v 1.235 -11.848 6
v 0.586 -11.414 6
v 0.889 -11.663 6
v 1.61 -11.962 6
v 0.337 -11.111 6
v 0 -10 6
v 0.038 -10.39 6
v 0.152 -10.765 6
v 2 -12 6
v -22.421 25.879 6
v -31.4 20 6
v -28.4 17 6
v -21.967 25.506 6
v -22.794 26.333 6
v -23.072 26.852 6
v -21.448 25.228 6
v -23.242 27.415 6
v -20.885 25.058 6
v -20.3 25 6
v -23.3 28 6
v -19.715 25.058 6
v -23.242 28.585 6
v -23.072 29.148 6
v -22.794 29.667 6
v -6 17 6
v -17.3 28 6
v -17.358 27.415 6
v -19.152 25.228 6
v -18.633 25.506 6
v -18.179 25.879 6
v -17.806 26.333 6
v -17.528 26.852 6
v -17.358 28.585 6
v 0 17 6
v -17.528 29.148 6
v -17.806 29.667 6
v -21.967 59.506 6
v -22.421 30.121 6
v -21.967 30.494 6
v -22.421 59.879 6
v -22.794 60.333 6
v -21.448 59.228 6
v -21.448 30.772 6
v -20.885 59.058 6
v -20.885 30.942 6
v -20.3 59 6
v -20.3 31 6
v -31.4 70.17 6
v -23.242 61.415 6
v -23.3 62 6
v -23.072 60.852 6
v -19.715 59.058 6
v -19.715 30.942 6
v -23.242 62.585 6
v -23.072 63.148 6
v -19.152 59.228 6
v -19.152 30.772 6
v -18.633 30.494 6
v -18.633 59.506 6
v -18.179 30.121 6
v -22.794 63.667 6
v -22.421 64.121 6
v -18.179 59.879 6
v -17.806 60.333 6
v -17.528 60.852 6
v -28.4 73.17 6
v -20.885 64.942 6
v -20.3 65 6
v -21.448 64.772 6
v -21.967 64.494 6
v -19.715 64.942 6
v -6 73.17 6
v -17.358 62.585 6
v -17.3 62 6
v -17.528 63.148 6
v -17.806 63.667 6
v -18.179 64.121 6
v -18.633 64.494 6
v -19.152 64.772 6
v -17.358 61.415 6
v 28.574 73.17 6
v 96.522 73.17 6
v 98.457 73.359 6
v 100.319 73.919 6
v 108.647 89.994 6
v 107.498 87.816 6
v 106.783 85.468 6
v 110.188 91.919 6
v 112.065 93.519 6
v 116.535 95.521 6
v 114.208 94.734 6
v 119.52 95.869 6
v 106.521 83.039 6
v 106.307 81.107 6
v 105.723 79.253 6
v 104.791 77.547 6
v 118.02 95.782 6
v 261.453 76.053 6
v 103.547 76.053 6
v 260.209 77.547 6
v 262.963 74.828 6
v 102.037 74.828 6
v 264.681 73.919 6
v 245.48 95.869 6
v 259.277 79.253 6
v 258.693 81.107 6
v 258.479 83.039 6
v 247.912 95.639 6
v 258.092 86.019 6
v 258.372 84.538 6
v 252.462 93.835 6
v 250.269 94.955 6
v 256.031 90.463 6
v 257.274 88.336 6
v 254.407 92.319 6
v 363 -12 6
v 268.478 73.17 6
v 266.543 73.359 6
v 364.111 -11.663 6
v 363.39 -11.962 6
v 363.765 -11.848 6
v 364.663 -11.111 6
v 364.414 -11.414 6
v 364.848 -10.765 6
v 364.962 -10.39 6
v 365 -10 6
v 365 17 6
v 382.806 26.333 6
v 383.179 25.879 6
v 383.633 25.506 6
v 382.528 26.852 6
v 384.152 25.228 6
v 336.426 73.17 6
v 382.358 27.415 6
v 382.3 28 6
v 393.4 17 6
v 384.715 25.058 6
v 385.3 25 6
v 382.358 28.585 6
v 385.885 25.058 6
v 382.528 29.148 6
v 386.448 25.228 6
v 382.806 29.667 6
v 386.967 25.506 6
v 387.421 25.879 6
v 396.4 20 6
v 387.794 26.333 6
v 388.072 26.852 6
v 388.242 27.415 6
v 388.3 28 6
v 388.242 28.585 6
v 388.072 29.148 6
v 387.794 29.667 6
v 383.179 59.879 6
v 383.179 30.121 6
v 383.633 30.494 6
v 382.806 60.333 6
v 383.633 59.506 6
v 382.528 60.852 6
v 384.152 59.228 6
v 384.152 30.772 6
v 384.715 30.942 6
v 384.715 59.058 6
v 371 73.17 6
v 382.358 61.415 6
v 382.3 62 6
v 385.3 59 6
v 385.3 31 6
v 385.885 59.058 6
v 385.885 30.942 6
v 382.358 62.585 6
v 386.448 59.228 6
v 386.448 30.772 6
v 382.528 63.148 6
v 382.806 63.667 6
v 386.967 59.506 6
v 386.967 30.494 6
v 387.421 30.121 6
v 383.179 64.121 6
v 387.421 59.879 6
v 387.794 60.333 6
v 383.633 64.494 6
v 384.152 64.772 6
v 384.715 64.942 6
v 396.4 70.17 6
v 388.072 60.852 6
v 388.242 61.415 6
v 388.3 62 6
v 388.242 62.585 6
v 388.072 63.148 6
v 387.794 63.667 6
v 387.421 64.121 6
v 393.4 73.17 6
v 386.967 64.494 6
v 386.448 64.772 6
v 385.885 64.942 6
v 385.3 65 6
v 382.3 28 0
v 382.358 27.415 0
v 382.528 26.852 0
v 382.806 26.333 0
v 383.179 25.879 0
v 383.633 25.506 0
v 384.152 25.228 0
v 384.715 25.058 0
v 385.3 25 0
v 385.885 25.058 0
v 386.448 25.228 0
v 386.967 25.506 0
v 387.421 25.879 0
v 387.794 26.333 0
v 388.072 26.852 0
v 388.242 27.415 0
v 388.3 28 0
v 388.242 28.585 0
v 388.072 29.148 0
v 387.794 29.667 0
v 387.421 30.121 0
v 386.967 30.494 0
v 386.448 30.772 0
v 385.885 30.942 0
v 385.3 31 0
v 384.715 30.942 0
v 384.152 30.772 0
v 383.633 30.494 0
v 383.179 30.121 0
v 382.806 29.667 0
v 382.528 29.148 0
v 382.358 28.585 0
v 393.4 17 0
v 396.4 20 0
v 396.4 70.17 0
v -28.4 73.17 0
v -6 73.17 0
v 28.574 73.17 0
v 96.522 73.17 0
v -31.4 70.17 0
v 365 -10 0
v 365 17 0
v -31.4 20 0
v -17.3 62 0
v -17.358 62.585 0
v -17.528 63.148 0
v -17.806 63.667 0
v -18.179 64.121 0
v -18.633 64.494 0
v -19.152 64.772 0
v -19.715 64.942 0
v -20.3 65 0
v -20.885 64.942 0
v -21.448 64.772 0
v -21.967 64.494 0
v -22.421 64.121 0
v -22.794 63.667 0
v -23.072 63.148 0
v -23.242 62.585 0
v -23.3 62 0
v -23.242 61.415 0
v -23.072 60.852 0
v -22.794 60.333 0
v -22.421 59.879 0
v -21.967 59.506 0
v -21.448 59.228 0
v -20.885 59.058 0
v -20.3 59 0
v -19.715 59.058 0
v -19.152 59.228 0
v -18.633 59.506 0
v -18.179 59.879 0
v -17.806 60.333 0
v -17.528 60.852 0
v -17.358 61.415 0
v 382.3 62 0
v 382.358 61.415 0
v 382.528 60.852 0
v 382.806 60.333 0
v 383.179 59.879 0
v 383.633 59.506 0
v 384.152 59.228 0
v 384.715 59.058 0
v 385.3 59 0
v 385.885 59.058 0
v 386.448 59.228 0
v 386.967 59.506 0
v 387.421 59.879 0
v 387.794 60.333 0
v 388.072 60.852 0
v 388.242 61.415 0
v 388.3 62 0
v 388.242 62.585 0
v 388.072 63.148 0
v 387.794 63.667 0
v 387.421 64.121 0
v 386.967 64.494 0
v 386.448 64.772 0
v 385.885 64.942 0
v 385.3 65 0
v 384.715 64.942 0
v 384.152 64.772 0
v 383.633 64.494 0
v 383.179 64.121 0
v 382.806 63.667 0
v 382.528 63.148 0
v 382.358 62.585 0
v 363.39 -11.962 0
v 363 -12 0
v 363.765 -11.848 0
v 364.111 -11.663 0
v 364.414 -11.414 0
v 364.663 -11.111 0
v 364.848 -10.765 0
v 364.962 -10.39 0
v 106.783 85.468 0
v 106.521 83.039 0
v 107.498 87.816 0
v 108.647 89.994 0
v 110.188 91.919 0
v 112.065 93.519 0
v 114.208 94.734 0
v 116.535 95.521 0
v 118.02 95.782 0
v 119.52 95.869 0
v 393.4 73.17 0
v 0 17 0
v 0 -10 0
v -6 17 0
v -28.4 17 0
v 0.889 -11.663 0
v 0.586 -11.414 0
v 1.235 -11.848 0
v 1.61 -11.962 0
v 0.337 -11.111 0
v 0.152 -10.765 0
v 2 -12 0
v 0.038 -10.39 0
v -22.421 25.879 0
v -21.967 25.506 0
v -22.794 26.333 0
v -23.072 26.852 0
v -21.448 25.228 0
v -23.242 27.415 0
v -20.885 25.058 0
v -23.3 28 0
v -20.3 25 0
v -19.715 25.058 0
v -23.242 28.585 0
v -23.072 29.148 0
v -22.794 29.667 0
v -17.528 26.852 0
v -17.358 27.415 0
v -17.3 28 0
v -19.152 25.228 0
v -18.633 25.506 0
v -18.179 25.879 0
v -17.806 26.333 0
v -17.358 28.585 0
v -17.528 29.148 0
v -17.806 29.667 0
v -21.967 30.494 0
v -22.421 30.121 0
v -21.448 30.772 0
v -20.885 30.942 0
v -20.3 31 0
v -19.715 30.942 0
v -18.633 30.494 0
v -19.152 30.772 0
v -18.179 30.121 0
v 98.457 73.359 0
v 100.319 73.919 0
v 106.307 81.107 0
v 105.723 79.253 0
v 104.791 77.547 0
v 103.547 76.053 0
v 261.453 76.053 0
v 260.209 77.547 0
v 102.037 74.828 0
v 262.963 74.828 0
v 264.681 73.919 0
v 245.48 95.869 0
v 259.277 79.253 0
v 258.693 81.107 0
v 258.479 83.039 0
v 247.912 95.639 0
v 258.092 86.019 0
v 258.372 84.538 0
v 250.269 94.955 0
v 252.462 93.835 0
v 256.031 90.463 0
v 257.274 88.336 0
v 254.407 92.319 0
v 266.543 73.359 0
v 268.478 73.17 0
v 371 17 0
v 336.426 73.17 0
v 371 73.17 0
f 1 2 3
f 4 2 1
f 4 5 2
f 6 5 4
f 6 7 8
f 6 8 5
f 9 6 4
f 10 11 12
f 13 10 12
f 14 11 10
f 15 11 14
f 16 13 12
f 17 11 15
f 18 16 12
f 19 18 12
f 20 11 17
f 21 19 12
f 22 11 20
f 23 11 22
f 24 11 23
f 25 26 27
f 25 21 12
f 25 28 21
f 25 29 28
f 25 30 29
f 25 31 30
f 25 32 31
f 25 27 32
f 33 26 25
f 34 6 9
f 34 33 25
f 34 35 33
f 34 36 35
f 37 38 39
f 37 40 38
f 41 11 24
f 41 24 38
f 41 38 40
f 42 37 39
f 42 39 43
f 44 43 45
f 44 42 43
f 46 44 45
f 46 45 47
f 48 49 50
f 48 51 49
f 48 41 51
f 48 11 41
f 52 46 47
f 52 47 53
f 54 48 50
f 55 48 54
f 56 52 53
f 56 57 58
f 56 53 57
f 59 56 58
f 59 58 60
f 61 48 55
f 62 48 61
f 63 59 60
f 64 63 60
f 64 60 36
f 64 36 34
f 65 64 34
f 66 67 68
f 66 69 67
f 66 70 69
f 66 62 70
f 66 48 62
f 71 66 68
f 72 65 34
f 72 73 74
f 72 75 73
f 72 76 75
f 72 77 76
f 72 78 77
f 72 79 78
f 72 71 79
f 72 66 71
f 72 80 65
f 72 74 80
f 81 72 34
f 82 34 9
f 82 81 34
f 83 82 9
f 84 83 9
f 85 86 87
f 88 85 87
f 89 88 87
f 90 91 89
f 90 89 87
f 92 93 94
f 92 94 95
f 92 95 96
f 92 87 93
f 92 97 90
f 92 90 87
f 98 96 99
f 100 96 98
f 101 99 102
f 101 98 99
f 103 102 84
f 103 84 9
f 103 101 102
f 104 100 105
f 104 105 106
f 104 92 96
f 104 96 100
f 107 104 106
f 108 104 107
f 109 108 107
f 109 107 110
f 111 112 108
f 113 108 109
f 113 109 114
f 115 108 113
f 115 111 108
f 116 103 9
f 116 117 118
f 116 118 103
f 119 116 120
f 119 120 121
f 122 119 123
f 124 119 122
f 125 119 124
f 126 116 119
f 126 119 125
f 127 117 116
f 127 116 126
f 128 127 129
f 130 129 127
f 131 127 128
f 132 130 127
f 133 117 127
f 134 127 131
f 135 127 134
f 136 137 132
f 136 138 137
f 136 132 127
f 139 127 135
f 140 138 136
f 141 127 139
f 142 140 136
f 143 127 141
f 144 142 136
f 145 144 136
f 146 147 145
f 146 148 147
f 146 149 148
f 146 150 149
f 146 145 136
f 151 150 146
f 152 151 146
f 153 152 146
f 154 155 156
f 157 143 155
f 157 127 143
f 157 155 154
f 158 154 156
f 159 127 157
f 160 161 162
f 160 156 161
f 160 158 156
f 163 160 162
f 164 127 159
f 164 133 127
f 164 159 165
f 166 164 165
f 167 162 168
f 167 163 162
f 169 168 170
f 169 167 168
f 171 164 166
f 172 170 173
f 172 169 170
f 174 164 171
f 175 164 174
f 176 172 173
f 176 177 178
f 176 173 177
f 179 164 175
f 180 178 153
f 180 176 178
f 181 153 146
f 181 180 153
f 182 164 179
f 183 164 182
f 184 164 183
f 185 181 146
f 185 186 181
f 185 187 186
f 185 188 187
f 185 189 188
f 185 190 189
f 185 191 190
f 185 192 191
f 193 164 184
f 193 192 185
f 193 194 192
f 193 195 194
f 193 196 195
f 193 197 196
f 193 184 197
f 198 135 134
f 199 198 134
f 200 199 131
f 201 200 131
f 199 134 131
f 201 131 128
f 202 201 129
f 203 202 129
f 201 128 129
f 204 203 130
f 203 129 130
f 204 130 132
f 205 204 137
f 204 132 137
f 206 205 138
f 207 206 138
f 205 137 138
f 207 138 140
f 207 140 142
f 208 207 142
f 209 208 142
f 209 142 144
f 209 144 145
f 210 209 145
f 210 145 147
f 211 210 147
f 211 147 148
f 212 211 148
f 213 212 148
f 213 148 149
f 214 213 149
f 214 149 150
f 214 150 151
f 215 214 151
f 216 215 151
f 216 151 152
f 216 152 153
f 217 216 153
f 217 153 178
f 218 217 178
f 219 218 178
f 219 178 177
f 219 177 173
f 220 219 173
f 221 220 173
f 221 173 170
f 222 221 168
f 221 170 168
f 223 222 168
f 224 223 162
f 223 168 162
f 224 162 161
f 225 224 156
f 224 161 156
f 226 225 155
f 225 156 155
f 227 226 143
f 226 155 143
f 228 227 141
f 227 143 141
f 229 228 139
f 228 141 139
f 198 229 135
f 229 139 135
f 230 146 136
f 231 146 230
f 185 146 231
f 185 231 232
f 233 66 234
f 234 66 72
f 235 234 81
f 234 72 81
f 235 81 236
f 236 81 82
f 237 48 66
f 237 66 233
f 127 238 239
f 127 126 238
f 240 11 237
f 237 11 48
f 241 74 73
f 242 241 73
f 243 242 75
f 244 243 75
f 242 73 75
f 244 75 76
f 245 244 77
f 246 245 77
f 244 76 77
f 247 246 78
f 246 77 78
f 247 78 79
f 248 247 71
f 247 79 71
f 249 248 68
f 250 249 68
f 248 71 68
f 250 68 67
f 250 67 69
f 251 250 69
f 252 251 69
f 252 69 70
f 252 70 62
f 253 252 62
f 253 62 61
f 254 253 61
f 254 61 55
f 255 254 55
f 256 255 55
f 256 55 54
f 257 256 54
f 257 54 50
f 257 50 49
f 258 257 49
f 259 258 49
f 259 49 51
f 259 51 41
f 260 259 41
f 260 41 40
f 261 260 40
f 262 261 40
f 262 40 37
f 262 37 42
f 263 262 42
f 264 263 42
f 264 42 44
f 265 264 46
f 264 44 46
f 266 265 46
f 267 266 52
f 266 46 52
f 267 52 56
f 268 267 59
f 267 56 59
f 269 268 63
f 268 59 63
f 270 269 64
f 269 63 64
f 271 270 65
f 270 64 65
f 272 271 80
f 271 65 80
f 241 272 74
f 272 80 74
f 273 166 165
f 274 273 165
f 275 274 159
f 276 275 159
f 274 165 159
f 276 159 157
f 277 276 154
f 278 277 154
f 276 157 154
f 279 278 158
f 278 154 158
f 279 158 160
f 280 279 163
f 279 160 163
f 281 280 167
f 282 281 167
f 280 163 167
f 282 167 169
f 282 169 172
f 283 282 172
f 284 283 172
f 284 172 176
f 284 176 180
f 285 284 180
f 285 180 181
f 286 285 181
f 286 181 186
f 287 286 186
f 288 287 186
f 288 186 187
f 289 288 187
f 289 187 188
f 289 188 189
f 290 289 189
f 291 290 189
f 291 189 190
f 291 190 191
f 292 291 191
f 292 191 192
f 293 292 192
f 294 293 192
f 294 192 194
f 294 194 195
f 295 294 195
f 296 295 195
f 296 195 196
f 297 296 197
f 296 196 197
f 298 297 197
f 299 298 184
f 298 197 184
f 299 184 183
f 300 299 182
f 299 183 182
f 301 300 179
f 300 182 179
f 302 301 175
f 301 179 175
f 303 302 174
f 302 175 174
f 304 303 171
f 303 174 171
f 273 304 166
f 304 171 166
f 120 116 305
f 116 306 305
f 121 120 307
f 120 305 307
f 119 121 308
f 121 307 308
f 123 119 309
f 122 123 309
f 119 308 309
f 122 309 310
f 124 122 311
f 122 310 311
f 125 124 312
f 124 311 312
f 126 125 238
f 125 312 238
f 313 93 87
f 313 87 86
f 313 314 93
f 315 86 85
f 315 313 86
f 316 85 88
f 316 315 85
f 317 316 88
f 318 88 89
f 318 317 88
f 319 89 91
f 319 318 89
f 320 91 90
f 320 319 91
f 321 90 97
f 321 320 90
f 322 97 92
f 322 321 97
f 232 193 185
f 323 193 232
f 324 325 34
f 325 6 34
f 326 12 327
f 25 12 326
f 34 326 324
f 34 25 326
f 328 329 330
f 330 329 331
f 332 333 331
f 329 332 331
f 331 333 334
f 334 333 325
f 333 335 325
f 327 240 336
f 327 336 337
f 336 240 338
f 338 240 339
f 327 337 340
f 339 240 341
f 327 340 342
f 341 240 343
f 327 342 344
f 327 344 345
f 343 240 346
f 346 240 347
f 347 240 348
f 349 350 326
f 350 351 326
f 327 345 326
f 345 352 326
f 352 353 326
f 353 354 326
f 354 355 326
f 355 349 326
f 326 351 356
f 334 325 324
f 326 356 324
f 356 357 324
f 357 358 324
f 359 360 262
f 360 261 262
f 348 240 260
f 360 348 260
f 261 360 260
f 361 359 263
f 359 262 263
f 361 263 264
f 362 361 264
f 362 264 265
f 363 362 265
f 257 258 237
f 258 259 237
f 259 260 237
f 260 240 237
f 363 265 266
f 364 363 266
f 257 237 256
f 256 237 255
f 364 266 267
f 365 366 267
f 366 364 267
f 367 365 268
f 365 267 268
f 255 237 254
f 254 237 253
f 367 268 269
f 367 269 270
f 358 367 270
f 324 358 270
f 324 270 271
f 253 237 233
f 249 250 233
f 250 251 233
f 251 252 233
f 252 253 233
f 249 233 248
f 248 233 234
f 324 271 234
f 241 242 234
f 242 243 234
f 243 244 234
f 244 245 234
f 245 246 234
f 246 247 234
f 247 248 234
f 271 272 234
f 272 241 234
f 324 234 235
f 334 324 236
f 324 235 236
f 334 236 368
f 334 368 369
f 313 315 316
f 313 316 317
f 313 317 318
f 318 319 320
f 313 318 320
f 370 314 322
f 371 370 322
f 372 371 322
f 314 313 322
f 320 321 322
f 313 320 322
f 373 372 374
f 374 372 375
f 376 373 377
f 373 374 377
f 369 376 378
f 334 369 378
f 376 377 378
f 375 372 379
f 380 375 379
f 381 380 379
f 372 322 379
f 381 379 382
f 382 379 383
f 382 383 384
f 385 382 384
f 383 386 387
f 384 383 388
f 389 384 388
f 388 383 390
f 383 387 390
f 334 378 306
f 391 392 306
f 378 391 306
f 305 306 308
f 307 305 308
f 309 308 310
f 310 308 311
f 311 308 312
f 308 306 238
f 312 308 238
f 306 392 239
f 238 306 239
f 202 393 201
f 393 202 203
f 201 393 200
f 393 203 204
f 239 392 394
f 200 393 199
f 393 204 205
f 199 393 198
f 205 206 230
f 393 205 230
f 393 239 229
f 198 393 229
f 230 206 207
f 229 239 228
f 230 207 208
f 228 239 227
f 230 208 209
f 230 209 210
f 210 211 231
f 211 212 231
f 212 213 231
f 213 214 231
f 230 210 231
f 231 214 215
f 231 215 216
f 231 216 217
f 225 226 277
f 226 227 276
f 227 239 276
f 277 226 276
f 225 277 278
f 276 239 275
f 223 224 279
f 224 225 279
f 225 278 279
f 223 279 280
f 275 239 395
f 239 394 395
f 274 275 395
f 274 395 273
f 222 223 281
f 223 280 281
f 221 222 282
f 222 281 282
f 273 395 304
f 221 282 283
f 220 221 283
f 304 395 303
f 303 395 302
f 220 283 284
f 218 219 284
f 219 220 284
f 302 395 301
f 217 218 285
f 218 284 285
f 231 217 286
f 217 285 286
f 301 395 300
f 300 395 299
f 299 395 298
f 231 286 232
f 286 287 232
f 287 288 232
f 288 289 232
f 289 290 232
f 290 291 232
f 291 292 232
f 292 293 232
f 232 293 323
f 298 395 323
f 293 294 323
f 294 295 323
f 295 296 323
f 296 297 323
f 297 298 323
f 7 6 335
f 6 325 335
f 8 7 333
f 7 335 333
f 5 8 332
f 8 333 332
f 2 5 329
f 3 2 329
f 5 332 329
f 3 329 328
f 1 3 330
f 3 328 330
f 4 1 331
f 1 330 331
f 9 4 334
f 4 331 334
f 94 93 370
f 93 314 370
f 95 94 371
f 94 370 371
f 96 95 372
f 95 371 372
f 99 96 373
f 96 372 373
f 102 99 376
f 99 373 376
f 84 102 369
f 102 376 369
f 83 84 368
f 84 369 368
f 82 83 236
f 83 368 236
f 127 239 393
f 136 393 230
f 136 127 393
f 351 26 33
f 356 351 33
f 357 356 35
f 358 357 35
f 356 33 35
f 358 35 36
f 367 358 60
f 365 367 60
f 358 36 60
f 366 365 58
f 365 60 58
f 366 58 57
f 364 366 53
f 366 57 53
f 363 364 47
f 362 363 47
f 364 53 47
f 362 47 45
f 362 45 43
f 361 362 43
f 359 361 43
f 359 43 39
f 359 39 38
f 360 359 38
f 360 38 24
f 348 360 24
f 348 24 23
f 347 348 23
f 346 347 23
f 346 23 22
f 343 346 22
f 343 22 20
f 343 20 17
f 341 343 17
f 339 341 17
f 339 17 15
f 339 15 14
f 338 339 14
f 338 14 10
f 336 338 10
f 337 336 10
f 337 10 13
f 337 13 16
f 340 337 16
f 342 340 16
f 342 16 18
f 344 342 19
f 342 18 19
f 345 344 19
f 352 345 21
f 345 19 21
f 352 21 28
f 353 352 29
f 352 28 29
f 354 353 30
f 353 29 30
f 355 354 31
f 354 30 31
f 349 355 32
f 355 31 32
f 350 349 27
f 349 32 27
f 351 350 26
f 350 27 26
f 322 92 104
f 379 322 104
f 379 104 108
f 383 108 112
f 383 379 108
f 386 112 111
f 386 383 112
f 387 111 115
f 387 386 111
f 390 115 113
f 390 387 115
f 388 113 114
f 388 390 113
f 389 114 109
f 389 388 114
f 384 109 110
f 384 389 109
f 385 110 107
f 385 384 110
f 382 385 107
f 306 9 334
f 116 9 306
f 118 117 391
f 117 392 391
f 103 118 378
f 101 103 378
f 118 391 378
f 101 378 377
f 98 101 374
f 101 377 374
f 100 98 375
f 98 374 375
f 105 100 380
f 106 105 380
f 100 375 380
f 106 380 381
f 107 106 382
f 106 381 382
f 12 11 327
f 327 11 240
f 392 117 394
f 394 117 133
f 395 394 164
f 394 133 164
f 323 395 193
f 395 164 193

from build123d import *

# Parameters (mm, degrees)
RESSALTO_EXTRUS_O1_DEPTH = 6
ESBO_O2_W                = 87.948383594
ESBO_O2_H                = 90.794457537
CORTE_EXTRUS_O1_DEPTH    = 10
FILETE1_R                = 10
FILETE2_R                = 1
ESBO_O3_W                = 6
ESBO_O3_H                = 20
RESSALTO_EXTRUS_O2_DEPTH = 6
FILETE3_R                = 1
ESBO_O4_W                = 6
ESBO_O4_H                = 9.607959318
CORTE_EXTRUS_O2_DEPTH    = 6
CORTE_EXTRUS_O4_DEPTH    = 413.403928206
ESBO_O7_R                = 2.75
RESSALTO_EXTRUS_O3_DEPTH = 6
FILETE5_R                = 1
FILETE6_R                = 10
ESBO_O9_W                = 65.01383902
ESBO_O9_H                = 118.32551617
ESBO_O9_W_2              = 62.115199348
ESBO_O9_H_2              = 131.353950202
CORTE_EXTRUS_O5_DEPTH    = 417.006009572
ESBO_O10_W               = 6
ESBO_O10_H               = 17
CORTE_EXTRUS_O6_DEPTH    = 390.532068305
ESBO_O11_W               = 365
ESBO_O11_H               = 12
RESSALTO_EXTRUS_O4_DEPTH = 6
ESBO_O12_W               = 25.4
ESBO_O12_H               = 56.170187659
RESSALTO_EXTRUS_O5_DEPTH = 6
CHANFRO1_SIZE            = 3
FILETE7_R                = 2
ESBO_O13_R               = 3
CORTE_EXTRUS_O7_DEPTH    = 414.796075668
ESBO_O14_W               = 154.34893278
ESBO_O14_H               = 36.016450872
CORTE_EXTRUS_O8_DEPTH    = 414.796075668
FILETE8_R                = 13


with BuildPart() as part:
    # Esboço1 → Ressalto-extrusão1 (new body)
    with BuildSketch(Plane.XY):
        Polygon((0, 103.5), (0, 180), (365, 180), (365, 103.5), (371, 103.5), (371, 4.5), (365, 4.5), (365, 0), (0, 0), (0, 4.5), (-6, 4.5), (-6, 103.5), align=None)
    extrude(amount=RESSALTO_EXTRUS_O1_DEPTH)

    # Esboço2 → Corte-extrusão1 (cut)
    with BuildSketch(Plane.XY.offset(6)):
        with Locations((62.547917061, 118.567416428)):
            Rectangle(ESBO_O2_W, ESBO_O2_H)
        with Locations((302.452082939, 118.567416428)):
            Rectangle(ESBO_O2_W, ESBO_O2_H)
    extrude(amount=-CORTE_EXTRUS_O1_DEPTH, mode=Mode.SUBTRACT)

    # Filete1
    filete1_edges = [part.edges().sort_by_distance(p)[0] for p in [
        (18.573725264, 73.170187659, 3),
        (18.573725264, 163.964645196, 3),
        (106.522108858, 163.964645196, 3),
        (106.522108858, 73.170187659, 3),
        (346.426274736, 163.964645196, 3),
        (346.426274736, 73.170187659, 3),
        (258.477891142, 73.170187659, 3),
        (258.477891142, 163.964645196, 3),
    ]]
    fillet(filete1_edges, radius=FILETE1_R)

    # Filete2
    filete2_edges = [part.edges().sort_by_distance(p)[0] for p in [
        (-6, 103.5, 3),
        (-6, 4.5, 3),
        (371, 4.5, 3),
        (371, 103.5, 3),
    ]]
    fillet(filete2_edges, radius=FILETE2_R)

    # Esboço3 → Ressalto-extrusão2 (add)
    with BuildSketch(Plane.XY.offset(6)):
        with Locations((-3, 153.964645196)):
            Rectangle(ESBO_O3_W, ESBO_O3_H)
        with Locations((368, 153.964645196)):
            Rectangle(ESBO_O3_W, ESBO_O3_H)
    extrude(amount=-RESSALTO_EXTRUS_O2_DEPTH)

    # Filete3
    filete3_edges = [part.edges().sort_by_distance(p)[0] for p in [
        (-6, 143.964645196, 3),
        (-6, 163.964645196, 3),
        (371, 163.964645196, 3),
        (371, 143.964645196, 3),
    ]]
    fillet(filete3_edges, radius=FILETE3_R)

    # Esboço4 → Corte-extrusão2 (cut)
    with BuildSketch(Plane(origin=(371, 0, 0), x_dir=(0, 0, -1), z_dir=(1, 0, 0))):
        with Locations((-3, 98.696020341)):
            Rectangle(ESBO_O4_W, ESBO_O4_H)
    extrude(amount=-CORTE_EXTRUS_O2_DEPTH, mode=Mode.SUBTRACT)

    # Esboço6 → Corte-extrusão4 (cut, through all)
    with BuildSketch(Plane.XY.offset(6)):
        Polygon((106.522108858, 118.567416428), (258.477891142, 118.567416428), (346.426274736, 153.964645196), (346.426274736, 180), (18.573725264, 180), (18.573725264, 153.964645196), align=None)
    extrude(amount=-CORTE_EXTRUS_O4_DEPTH, mode=Mode.SUBTRACT)

    # Esboço7 → Ressalto-extrusão3 (add, through all)
    # profile 1 of 2: a face of its own
    with BuildSketch(Plane.XY.offset(6)):
        with BuildLine():
            ThreePointArc((-5, 163.964645196), (-15, 153.964645196), (-5, 143.964645196))
            ThreePointArc((-5, 143.964645196), (-3.426448861, 153.964645196), (-5, 163.964645196))
        make_face()
        with Locations((-9, 153.964645196)):
            Circle(ESBO_O7_R, mode=Mode.SUBTRACT)
    # profile 2 of 2: a face of its own
    with BuildSketch(Plane.XY.offset(6)):
        with BuildLine():
            ThreePointArc((365, 163.964645196), (363.426448861, 153.964645196), (365, 143.964645196))
            ThreePointArc((365, 143.964645196), (375, 153.964645196), (365, 163.964645196))
        make_face()
        with Locations((369, 153.964645196)):
            Circle(ESBO_O7_R, mode=Mode.SUBTRACT)
    extrude(amount=-RESSALTO_EXTRUS_O3_DEPTH)

    # Filete5
    filete5_edges = [part.edges().sort_by_distance(p)[0] for p in [
        (365, 180, 3),
        (0, 180, 3),
    ]]
    fillet(filete5_edges, radius=FILETE5_R)

    # Filete6
    filete6_edges = [part.edges().sort_by_distance(p)[0] for p in [
        (106.522108858, 118.567416428, 3),
        (258.477891142, 118.567416428, 3),
    ]]
    fillet(filete6_edges, radius=FILETE6_R)

    # Esboço9 → Corte-extrusão5 (cut, through all)
    with BuildSketch(Plane.XY.offset(6)):
        with Locations((-3.933194246, 132.332945744)):
            Rectangle(ESBO_O9_W, ESBO_O9_H)
        with Locations((367.48387441, 138.84716276)):
            Rectangle(ESBO_O9_W_2, ESBO_O9_H_2)
    extrude(amount=-CORTE_EXTRUS_O5_DEPTH, mode=Mode.SUBTRACT)

    # Esboço10 → Corte-extrusão6 (cut, through all)
    with BuildSketch(Plane.XY.offset(6)):
        with Locations((-3, 8.5)):
            Rectangle(ESBO_O10_W, ESBO_O10_H)
        with Locations((368, 8.5)):
            Rectangle(ESBO_O10_W, ESBO_O10_H)
    extrude(amount=-CORTE_EXTRUS_O6_DEPTH, mode=Mode.SUBTRACT)

    # Esboço11 → Ressalto-extrusão4 (add, through all)
    with BuildSketch(Plane.XY.offset(6)):
        with Locations((182.5, -6)):
            Rectangle(ESBO_O11_W, ESBO_O11_H)
    extrude(amount=-RESSALTO_EXTRUS_O4_DEPTH)

    # Esboço12 → Ressalto-extrusão5 (add, through all)
    with BuildSketch(Plane.XY.offset(6)):
        with Locations((383.7, 45.08509383)):
            Rectangle(ESBO_O12_W, ESBO_O12_H)
        with Locations((-18.7, 45.08509383)):
            Rectangle(ESBO_O12_W, ESBO_O12_H)
    extrude(amount=-RESSALTO_EXTRUS_O5_DEPTH)

    # Chanfro1
    chanfro1_edges = [part.edges().sort_by_distance(p)[0] for p in [
        (396.4, 73.170187659, 3),
        (396.4, 17, 3),
        (-31.4, 17, 3),
        (-31.4, 73.170187659, 3),
    ]]
    chamfer(chanfro1_edges, length=CHANFRO1_SIZE)

    # Filete7
    filete7_edges = [part.edges().sort_by_distance(p)[0] for p in [
        (0, -12, 3),
        (365, -12, 3),
    ]]
    fillet(filete7_edges, radius=FILETE7_R)

    # Esboço13 → Corte-extrusão7 (cut, through all)
    with BuildSketch(Plane.XY.offset(6)):
        with Locations((-20.3, 62)):
            Circle(ESBO_O13_R)
        with Locations((-20.3, 28)):
            Circle(ESBO_O13_R)
        with Locations(Location((385.3, 28, 0), (0, 0, 180))):
            Circle(ESBO_O13_R)
        with Locations(Location((385.3, 62, 0), (0, 0, 180))):
            Circle(ESBO_O13_R)
    extrude(amount=-CORTE_EXTRUS_O7_DEPTH, mode=Mode.SUBTRACT)

    # Esboço14 → Corte-extrusão8 (cut, through all)
    with BuildSketch(Plane.XY.offset(6)):
        with Locations((183.696575248, 113.87702748)):
            Rectangle(ESBO_O14_W, ESBO_O14_H)
    extrude(amount=-CORTE_EXTRUS_O8_DEPTH, mode=Mode.SUBTRACT)

    # Filete8
    filete8_edges = [part.edges().sort_by_distance(p)[0] for p in [
        (106.522108858, 95.868802044, 3),
        (258.477891142, 95.868802044, 3),
    ]]
    fillet(filete8_edges, radius=FILETE8_R)


solid = part.part
